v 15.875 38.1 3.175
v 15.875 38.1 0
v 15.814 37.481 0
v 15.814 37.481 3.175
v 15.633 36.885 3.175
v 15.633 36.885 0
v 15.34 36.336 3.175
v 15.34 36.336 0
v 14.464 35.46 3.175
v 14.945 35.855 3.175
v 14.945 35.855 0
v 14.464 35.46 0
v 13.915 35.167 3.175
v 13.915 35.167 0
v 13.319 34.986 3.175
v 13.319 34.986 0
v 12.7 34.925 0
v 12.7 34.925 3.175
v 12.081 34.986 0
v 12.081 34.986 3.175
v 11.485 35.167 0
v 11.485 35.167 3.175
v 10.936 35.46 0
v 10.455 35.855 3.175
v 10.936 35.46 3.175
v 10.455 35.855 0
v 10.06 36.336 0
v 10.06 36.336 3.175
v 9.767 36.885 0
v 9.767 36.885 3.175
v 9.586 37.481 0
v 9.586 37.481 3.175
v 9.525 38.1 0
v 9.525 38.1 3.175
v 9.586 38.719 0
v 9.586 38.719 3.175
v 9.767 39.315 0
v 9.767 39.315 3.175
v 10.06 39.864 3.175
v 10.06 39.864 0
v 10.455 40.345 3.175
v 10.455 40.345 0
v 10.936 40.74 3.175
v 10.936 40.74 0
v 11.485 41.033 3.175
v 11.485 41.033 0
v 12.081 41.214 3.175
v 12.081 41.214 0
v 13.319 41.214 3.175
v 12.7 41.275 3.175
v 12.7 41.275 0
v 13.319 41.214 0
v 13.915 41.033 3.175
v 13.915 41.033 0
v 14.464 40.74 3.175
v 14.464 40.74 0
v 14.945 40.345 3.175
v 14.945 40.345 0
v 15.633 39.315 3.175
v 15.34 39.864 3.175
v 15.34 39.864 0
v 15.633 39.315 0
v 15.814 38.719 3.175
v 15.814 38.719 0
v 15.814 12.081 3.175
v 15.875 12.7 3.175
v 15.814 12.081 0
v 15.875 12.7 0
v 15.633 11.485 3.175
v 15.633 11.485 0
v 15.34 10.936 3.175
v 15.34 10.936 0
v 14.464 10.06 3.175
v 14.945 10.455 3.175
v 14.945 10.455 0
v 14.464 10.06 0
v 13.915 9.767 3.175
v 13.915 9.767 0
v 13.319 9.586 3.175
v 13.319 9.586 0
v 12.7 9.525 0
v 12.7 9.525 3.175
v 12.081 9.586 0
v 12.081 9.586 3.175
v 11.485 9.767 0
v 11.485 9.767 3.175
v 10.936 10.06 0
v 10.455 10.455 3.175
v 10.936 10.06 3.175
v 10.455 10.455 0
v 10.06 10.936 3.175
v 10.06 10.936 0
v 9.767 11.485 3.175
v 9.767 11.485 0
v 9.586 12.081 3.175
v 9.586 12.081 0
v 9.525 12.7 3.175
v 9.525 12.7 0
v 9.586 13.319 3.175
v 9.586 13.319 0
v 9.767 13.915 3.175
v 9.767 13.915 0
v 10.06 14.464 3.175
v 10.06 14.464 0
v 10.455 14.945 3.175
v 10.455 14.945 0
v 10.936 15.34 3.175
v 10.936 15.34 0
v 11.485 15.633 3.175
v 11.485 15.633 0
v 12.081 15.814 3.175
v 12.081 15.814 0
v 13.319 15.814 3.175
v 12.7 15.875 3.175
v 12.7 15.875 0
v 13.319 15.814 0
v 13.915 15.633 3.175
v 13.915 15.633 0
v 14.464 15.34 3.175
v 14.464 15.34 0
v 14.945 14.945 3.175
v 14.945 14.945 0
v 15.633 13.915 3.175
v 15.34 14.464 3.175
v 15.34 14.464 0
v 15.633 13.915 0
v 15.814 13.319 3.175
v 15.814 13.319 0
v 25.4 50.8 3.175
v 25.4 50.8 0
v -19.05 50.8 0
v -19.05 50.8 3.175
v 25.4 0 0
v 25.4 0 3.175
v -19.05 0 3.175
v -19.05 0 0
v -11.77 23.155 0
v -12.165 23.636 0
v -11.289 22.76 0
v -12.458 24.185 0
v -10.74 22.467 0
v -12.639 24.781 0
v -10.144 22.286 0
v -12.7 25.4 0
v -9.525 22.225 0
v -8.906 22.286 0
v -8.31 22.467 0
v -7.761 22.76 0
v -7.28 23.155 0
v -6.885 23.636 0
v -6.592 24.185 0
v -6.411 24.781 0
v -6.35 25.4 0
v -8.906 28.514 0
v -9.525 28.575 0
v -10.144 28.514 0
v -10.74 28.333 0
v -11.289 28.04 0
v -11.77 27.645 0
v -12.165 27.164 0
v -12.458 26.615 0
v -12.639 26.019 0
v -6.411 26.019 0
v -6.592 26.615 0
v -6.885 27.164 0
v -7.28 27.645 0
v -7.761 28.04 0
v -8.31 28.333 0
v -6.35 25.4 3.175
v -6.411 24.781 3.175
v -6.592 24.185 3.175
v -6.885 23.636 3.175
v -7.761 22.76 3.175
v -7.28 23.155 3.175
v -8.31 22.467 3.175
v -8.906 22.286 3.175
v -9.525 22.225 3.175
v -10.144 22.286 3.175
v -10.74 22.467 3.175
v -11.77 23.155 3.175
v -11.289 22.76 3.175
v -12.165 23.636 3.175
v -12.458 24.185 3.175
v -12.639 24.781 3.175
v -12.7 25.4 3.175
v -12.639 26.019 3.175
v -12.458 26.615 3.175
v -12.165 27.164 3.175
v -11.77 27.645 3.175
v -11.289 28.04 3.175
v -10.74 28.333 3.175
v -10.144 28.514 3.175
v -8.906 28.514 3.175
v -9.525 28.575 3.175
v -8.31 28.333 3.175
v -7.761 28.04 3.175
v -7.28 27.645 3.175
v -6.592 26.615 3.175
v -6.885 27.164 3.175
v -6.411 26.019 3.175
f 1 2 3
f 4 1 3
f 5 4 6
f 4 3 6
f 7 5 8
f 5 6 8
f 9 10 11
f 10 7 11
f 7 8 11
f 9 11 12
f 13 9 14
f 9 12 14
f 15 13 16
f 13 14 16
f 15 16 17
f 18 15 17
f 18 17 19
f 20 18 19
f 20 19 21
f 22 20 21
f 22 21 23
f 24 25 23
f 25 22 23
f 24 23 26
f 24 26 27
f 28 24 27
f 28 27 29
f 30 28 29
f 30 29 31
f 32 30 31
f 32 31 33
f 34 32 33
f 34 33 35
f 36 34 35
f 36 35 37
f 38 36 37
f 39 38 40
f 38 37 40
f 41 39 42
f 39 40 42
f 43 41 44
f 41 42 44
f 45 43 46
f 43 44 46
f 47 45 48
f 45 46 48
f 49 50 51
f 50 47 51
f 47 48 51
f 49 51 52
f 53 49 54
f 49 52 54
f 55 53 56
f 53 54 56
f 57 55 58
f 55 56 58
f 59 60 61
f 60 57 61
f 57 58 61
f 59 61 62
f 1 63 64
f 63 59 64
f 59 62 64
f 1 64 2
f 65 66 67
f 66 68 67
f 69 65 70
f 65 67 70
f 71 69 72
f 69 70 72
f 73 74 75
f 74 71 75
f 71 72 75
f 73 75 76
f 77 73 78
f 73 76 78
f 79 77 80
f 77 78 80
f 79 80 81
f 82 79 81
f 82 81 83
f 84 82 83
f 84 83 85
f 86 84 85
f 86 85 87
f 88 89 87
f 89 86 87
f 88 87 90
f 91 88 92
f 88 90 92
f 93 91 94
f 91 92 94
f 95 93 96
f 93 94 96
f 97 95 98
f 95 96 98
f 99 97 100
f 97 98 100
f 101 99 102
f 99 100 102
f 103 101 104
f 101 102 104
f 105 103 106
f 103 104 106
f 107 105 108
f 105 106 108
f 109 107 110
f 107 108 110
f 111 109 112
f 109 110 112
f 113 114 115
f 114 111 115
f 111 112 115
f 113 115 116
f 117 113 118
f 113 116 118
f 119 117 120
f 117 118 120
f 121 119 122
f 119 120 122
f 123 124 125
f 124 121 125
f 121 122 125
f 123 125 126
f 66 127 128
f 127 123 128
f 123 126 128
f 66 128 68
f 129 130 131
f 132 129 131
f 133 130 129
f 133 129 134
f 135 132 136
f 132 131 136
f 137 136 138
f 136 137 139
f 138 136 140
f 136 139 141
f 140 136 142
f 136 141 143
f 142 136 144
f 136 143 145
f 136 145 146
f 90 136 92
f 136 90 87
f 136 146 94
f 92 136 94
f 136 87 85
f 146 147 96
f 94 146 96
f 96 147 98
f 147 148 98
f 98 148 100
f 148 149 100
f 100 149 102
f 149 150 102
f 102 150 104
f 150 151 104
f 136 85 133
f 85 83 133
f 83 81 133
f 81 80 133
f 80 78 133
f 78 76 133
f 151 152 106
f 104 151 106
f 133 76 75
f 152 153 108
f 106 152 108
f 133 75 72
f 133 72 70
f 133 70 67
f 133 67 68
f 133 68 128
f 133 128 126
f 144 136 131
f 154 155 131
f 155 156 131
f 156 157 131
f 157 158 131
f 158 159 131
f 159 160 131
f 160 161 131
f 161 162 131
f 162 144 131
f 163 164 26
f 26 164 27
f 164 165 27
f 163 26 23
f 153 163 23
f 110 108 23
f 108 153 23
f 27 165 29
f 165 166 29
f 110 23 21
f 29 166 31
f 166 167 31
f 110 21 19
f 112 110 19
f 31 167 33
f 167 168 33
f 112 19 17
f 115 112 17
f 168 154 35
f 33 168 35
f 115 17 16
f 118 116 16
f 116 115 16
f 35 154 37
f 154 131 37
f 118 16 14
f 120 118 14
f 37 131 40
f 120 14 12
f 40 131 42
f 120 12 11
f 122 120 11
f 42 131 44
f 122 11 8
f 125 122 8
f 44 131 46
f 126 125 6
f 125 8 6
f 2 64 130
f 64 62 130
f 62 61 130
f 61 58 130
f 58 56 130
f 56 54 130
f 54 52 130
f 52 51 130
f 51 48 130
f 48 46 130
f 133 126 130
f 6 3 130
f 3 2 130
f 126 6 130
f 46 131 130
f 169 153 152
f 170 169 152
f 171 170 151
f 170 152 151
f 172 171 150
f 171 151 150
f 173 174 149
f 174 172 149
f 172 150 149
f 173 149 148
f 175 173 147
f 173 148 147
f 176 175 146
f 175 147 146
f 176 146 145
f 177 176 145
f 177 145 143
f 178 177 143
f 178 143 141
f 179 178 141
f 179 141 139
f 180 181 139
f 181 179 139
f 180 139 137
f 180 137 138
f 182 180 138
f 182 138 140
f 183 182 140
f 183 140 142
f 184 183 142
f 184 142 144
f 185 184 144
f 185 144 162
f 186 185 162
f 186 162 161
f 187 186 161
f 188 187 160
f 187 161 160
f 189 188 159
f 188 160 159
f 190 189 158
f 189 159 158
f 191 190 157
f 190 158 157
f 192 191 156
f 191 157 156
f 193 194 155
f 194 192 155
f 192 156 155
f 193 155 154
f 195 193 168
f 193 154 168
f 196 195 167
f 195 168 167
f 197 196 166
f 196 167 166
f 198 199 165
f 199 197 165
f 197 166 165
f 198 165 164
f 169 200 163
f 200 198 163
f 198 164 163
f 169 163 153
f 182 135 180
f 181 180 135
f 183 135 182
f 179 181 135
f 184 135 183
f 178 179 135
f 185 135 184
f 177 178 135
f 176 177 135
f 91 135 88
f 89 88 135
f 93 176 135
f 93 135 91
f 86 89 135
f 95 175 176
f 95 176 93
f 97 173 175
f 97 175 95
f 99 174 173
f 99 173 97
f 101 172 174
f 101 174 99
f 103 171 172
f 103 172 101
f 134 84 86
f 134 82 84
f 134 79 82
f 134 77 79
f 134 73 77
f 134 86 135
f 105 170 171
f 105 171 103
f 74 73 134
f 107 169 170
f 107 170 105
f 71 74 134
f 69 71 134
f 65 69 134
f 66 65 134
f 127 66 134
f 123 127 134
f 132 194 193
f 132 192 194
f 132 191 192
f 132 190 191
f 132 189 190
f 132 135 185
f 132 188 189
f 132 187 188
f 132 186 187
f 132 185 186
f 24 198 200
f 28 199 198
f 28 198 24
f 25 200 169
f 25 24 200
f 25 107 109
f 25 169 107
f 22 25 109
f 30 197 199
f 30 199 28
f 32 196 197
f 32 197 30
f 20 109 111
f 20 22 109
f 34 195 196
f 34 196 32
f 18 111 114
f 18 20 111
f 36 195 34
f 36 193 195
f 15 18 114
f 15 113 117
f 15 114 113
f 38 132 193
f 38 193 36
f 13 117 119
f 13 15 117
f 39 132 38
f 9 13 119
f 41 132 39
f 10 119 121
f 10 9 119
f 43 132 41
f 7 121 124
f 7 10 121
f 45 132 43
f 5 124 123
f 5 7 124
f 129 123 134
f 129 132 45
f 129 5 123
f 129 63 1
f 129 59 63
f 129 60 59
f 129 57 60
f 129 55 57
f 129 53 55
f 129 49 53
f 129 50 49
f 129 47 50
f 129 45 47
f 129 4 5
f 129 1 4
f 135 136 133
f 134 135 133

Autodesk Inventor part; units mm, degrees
ref_plane "YZ Plane" through (0, 0, 0) normal (1, 0, 0) x (0, 1, 0)
ref_plane "XZ Plane" through (0, 0, 0) normal (0, 1, 0) x (-1, 0, 0)
ref_plane "XY Plane" through (0, 0, 0) normal (0, 0, 1) x (1, 0, 0)
sketch "Sketch1" plane through (0, 0, 0) normal (0, 0, 1) x (1, 0, 0)
  line L0 (355.6, 50.8) -> (-19.05, 50.8)
  line L1 (12.7, 50.8) -> (12.7, 0) construction
  line L2 (0, 38.1) -> (12.7, 38.1) construction
  line L3 (0, 12.7) -> (12.7, 12.7) construction
  circle A0 centre (12.7, 38.1) radius 3.175
  circle A1 centre (12.7, 12.7) radius 3.175
  line L4 (168.275, 50.8) -> (168.275, 0) construction
  line L5 (-19.05, 50.8) -> (-19.05, 0)
  line L6 (355.6, 50.8) -> (355.6, 0)
  circle A2 centre (-9.525, 25.4) radius 3.175
  circle A3 centre (323.85, 38.1) radius 3.175
  circle A4 centre (323.85, 12.7) radius 3.175
  line L7 (355.6, 50.8) -> (355.6, 0)
  circle A5 centre (346.075, 25.4) radius 3.175
  line L8 (-19.05, 0) -> (355.6, 0)
  dimension "d0" = 374.65
  dimension "d3" = 12.7
  dimension "d4" = 25.4
  dimension "d5" = 6.35
  dimension "d6" = 6.35
  dimension "d10" = 6.35
  dimension "d11" = 31.75
extrude "Extrusion2" add sketch "Sketch1" along normal blind 3.175
sketch "Sketch3" plane through (0, 0, 3.175) normal (0, 0, 1) x (1, 0, 0)
  line L0 (-19.05, 50.8) -> (-19.05, 0) projected
  line L1 (-19.05, 25.4) -> (168.275, 25.4)
  line L2 (355.6, 50.8) -> (-19.05, 50.8) projected
  line L3 (168.275, 25.4) -> (168.275, 50.8)
  point P0 (0, 0)
hole "Hole1" at (168.275, 25.4, 3.175) direction (0, 0, -1) diameter 22.86 depth 25.4 tip angle 118
sketch "Sketch4" plane through (0, 0, 3.175) normal (0, 0, 1) x (1, 0, 0)
  circle A0 centre (168.275, 25.4) radius 11.43 projected
  line L0 (168.275, 25.4) -> (142.875, 25.4)
  circle A1 centre (142.875, 25.4) radius 3.175
  line L1 (355.6, 50.8) -> (-19.05, 50.8) projected
  line L2 (168.275, 50.8) -> (168.275, 0)
  circle A2 centre (193.675, 25.4) radius 3.175
  point P0 (0, 0)
  dimension "d21" = 25.4
  dimension "d22" = 6.35
hole "Hole2" at (193.675, 25.4, 3.175) at (142.875, 25.4, 3.175) direction (0, 0, -1) diameter 6.35 depth 25.4 tip angle 118
sketch "Sketch5" plane through (0, 0, 3.175) normal (0, 0, 1) x (1, 0, 0)
  line L0 (355.6, 50.8) -> (-19.05, 50.8) projected
  line L1 (74.6506, 50.8) -> (74.6506, 0)
  line L2 (-19.05, 50.8) -> (-19.05, 0) projected
  line L3 (74.6506, 50.8) -> (74.6506, 44.45)
  line L4 (74.6506, 44.45) -> (74.6506, 25.4)
  circle A0 centre (74.6506, 44.45) radius 2.0701
  line L5 (74.6506, 25.4) -> (74.6506, 6.35)
  circle A1 centre (74.6506, 25.4) radius 2.0701
  circle A2 centre (74.6506, 6.35) radius 2.0701
  line L6 (168.275, 50.8) -> (168.275, 0)
  circle A3 centre (261.8994, 44.45) radius 2.0701
  circle A4 centre (261.8994, 25.4) radius 2.0701
  circle A5 centre (261.8994, 6.35) radius 2.0701
  point P0 (0, 0)
  dimension "d30" = 93.7006
  dimension "d31" = 6.35
  dimension "d32" = 19.05
  dimension "d33" = 4.1402
  dimension "d34" = 19.05
  dimension "d35" = 4.1402
  dimension "d36" = 4.1402
hole "Hole3" at (74.6506, 44.45, 3.175) at (74.6506, 25.4, 3.175) at (74.6506, 6.35, 3.175) at (261.8994, 44.45, 3.175) at (261.8994, 25.4, 3.175) at (261.8994, 6.35, 3.175) direction (0, 0, -1) diameter 4.1402 depth 25.4 tip angle 118
sketch "Sketch6" plane through (0, 0, 3.175) normal (0, 0, 1) x (1, 0, 0)
  circle A0 centre (12.7, 38.1) radius 3.175 projected
  line L0 (12.7, 38.1) -> (25.4, 38.1)
  line L1 (355.6, 50.8) -> (-19.05, 50.8) projected
  line L2 (25.4, 50.8) -> (25.4, 0)
  point P0 (0, 0)
  dimension "d44" = 12.7
split body "Split1" sketch "Sketch6" result one side removed curves L2 removed pieces at (41.1319, 25.4832, 0.5)
properties part number "2AM-17-P-0206 - moving support slider panl" material "Aluminum 6061"
